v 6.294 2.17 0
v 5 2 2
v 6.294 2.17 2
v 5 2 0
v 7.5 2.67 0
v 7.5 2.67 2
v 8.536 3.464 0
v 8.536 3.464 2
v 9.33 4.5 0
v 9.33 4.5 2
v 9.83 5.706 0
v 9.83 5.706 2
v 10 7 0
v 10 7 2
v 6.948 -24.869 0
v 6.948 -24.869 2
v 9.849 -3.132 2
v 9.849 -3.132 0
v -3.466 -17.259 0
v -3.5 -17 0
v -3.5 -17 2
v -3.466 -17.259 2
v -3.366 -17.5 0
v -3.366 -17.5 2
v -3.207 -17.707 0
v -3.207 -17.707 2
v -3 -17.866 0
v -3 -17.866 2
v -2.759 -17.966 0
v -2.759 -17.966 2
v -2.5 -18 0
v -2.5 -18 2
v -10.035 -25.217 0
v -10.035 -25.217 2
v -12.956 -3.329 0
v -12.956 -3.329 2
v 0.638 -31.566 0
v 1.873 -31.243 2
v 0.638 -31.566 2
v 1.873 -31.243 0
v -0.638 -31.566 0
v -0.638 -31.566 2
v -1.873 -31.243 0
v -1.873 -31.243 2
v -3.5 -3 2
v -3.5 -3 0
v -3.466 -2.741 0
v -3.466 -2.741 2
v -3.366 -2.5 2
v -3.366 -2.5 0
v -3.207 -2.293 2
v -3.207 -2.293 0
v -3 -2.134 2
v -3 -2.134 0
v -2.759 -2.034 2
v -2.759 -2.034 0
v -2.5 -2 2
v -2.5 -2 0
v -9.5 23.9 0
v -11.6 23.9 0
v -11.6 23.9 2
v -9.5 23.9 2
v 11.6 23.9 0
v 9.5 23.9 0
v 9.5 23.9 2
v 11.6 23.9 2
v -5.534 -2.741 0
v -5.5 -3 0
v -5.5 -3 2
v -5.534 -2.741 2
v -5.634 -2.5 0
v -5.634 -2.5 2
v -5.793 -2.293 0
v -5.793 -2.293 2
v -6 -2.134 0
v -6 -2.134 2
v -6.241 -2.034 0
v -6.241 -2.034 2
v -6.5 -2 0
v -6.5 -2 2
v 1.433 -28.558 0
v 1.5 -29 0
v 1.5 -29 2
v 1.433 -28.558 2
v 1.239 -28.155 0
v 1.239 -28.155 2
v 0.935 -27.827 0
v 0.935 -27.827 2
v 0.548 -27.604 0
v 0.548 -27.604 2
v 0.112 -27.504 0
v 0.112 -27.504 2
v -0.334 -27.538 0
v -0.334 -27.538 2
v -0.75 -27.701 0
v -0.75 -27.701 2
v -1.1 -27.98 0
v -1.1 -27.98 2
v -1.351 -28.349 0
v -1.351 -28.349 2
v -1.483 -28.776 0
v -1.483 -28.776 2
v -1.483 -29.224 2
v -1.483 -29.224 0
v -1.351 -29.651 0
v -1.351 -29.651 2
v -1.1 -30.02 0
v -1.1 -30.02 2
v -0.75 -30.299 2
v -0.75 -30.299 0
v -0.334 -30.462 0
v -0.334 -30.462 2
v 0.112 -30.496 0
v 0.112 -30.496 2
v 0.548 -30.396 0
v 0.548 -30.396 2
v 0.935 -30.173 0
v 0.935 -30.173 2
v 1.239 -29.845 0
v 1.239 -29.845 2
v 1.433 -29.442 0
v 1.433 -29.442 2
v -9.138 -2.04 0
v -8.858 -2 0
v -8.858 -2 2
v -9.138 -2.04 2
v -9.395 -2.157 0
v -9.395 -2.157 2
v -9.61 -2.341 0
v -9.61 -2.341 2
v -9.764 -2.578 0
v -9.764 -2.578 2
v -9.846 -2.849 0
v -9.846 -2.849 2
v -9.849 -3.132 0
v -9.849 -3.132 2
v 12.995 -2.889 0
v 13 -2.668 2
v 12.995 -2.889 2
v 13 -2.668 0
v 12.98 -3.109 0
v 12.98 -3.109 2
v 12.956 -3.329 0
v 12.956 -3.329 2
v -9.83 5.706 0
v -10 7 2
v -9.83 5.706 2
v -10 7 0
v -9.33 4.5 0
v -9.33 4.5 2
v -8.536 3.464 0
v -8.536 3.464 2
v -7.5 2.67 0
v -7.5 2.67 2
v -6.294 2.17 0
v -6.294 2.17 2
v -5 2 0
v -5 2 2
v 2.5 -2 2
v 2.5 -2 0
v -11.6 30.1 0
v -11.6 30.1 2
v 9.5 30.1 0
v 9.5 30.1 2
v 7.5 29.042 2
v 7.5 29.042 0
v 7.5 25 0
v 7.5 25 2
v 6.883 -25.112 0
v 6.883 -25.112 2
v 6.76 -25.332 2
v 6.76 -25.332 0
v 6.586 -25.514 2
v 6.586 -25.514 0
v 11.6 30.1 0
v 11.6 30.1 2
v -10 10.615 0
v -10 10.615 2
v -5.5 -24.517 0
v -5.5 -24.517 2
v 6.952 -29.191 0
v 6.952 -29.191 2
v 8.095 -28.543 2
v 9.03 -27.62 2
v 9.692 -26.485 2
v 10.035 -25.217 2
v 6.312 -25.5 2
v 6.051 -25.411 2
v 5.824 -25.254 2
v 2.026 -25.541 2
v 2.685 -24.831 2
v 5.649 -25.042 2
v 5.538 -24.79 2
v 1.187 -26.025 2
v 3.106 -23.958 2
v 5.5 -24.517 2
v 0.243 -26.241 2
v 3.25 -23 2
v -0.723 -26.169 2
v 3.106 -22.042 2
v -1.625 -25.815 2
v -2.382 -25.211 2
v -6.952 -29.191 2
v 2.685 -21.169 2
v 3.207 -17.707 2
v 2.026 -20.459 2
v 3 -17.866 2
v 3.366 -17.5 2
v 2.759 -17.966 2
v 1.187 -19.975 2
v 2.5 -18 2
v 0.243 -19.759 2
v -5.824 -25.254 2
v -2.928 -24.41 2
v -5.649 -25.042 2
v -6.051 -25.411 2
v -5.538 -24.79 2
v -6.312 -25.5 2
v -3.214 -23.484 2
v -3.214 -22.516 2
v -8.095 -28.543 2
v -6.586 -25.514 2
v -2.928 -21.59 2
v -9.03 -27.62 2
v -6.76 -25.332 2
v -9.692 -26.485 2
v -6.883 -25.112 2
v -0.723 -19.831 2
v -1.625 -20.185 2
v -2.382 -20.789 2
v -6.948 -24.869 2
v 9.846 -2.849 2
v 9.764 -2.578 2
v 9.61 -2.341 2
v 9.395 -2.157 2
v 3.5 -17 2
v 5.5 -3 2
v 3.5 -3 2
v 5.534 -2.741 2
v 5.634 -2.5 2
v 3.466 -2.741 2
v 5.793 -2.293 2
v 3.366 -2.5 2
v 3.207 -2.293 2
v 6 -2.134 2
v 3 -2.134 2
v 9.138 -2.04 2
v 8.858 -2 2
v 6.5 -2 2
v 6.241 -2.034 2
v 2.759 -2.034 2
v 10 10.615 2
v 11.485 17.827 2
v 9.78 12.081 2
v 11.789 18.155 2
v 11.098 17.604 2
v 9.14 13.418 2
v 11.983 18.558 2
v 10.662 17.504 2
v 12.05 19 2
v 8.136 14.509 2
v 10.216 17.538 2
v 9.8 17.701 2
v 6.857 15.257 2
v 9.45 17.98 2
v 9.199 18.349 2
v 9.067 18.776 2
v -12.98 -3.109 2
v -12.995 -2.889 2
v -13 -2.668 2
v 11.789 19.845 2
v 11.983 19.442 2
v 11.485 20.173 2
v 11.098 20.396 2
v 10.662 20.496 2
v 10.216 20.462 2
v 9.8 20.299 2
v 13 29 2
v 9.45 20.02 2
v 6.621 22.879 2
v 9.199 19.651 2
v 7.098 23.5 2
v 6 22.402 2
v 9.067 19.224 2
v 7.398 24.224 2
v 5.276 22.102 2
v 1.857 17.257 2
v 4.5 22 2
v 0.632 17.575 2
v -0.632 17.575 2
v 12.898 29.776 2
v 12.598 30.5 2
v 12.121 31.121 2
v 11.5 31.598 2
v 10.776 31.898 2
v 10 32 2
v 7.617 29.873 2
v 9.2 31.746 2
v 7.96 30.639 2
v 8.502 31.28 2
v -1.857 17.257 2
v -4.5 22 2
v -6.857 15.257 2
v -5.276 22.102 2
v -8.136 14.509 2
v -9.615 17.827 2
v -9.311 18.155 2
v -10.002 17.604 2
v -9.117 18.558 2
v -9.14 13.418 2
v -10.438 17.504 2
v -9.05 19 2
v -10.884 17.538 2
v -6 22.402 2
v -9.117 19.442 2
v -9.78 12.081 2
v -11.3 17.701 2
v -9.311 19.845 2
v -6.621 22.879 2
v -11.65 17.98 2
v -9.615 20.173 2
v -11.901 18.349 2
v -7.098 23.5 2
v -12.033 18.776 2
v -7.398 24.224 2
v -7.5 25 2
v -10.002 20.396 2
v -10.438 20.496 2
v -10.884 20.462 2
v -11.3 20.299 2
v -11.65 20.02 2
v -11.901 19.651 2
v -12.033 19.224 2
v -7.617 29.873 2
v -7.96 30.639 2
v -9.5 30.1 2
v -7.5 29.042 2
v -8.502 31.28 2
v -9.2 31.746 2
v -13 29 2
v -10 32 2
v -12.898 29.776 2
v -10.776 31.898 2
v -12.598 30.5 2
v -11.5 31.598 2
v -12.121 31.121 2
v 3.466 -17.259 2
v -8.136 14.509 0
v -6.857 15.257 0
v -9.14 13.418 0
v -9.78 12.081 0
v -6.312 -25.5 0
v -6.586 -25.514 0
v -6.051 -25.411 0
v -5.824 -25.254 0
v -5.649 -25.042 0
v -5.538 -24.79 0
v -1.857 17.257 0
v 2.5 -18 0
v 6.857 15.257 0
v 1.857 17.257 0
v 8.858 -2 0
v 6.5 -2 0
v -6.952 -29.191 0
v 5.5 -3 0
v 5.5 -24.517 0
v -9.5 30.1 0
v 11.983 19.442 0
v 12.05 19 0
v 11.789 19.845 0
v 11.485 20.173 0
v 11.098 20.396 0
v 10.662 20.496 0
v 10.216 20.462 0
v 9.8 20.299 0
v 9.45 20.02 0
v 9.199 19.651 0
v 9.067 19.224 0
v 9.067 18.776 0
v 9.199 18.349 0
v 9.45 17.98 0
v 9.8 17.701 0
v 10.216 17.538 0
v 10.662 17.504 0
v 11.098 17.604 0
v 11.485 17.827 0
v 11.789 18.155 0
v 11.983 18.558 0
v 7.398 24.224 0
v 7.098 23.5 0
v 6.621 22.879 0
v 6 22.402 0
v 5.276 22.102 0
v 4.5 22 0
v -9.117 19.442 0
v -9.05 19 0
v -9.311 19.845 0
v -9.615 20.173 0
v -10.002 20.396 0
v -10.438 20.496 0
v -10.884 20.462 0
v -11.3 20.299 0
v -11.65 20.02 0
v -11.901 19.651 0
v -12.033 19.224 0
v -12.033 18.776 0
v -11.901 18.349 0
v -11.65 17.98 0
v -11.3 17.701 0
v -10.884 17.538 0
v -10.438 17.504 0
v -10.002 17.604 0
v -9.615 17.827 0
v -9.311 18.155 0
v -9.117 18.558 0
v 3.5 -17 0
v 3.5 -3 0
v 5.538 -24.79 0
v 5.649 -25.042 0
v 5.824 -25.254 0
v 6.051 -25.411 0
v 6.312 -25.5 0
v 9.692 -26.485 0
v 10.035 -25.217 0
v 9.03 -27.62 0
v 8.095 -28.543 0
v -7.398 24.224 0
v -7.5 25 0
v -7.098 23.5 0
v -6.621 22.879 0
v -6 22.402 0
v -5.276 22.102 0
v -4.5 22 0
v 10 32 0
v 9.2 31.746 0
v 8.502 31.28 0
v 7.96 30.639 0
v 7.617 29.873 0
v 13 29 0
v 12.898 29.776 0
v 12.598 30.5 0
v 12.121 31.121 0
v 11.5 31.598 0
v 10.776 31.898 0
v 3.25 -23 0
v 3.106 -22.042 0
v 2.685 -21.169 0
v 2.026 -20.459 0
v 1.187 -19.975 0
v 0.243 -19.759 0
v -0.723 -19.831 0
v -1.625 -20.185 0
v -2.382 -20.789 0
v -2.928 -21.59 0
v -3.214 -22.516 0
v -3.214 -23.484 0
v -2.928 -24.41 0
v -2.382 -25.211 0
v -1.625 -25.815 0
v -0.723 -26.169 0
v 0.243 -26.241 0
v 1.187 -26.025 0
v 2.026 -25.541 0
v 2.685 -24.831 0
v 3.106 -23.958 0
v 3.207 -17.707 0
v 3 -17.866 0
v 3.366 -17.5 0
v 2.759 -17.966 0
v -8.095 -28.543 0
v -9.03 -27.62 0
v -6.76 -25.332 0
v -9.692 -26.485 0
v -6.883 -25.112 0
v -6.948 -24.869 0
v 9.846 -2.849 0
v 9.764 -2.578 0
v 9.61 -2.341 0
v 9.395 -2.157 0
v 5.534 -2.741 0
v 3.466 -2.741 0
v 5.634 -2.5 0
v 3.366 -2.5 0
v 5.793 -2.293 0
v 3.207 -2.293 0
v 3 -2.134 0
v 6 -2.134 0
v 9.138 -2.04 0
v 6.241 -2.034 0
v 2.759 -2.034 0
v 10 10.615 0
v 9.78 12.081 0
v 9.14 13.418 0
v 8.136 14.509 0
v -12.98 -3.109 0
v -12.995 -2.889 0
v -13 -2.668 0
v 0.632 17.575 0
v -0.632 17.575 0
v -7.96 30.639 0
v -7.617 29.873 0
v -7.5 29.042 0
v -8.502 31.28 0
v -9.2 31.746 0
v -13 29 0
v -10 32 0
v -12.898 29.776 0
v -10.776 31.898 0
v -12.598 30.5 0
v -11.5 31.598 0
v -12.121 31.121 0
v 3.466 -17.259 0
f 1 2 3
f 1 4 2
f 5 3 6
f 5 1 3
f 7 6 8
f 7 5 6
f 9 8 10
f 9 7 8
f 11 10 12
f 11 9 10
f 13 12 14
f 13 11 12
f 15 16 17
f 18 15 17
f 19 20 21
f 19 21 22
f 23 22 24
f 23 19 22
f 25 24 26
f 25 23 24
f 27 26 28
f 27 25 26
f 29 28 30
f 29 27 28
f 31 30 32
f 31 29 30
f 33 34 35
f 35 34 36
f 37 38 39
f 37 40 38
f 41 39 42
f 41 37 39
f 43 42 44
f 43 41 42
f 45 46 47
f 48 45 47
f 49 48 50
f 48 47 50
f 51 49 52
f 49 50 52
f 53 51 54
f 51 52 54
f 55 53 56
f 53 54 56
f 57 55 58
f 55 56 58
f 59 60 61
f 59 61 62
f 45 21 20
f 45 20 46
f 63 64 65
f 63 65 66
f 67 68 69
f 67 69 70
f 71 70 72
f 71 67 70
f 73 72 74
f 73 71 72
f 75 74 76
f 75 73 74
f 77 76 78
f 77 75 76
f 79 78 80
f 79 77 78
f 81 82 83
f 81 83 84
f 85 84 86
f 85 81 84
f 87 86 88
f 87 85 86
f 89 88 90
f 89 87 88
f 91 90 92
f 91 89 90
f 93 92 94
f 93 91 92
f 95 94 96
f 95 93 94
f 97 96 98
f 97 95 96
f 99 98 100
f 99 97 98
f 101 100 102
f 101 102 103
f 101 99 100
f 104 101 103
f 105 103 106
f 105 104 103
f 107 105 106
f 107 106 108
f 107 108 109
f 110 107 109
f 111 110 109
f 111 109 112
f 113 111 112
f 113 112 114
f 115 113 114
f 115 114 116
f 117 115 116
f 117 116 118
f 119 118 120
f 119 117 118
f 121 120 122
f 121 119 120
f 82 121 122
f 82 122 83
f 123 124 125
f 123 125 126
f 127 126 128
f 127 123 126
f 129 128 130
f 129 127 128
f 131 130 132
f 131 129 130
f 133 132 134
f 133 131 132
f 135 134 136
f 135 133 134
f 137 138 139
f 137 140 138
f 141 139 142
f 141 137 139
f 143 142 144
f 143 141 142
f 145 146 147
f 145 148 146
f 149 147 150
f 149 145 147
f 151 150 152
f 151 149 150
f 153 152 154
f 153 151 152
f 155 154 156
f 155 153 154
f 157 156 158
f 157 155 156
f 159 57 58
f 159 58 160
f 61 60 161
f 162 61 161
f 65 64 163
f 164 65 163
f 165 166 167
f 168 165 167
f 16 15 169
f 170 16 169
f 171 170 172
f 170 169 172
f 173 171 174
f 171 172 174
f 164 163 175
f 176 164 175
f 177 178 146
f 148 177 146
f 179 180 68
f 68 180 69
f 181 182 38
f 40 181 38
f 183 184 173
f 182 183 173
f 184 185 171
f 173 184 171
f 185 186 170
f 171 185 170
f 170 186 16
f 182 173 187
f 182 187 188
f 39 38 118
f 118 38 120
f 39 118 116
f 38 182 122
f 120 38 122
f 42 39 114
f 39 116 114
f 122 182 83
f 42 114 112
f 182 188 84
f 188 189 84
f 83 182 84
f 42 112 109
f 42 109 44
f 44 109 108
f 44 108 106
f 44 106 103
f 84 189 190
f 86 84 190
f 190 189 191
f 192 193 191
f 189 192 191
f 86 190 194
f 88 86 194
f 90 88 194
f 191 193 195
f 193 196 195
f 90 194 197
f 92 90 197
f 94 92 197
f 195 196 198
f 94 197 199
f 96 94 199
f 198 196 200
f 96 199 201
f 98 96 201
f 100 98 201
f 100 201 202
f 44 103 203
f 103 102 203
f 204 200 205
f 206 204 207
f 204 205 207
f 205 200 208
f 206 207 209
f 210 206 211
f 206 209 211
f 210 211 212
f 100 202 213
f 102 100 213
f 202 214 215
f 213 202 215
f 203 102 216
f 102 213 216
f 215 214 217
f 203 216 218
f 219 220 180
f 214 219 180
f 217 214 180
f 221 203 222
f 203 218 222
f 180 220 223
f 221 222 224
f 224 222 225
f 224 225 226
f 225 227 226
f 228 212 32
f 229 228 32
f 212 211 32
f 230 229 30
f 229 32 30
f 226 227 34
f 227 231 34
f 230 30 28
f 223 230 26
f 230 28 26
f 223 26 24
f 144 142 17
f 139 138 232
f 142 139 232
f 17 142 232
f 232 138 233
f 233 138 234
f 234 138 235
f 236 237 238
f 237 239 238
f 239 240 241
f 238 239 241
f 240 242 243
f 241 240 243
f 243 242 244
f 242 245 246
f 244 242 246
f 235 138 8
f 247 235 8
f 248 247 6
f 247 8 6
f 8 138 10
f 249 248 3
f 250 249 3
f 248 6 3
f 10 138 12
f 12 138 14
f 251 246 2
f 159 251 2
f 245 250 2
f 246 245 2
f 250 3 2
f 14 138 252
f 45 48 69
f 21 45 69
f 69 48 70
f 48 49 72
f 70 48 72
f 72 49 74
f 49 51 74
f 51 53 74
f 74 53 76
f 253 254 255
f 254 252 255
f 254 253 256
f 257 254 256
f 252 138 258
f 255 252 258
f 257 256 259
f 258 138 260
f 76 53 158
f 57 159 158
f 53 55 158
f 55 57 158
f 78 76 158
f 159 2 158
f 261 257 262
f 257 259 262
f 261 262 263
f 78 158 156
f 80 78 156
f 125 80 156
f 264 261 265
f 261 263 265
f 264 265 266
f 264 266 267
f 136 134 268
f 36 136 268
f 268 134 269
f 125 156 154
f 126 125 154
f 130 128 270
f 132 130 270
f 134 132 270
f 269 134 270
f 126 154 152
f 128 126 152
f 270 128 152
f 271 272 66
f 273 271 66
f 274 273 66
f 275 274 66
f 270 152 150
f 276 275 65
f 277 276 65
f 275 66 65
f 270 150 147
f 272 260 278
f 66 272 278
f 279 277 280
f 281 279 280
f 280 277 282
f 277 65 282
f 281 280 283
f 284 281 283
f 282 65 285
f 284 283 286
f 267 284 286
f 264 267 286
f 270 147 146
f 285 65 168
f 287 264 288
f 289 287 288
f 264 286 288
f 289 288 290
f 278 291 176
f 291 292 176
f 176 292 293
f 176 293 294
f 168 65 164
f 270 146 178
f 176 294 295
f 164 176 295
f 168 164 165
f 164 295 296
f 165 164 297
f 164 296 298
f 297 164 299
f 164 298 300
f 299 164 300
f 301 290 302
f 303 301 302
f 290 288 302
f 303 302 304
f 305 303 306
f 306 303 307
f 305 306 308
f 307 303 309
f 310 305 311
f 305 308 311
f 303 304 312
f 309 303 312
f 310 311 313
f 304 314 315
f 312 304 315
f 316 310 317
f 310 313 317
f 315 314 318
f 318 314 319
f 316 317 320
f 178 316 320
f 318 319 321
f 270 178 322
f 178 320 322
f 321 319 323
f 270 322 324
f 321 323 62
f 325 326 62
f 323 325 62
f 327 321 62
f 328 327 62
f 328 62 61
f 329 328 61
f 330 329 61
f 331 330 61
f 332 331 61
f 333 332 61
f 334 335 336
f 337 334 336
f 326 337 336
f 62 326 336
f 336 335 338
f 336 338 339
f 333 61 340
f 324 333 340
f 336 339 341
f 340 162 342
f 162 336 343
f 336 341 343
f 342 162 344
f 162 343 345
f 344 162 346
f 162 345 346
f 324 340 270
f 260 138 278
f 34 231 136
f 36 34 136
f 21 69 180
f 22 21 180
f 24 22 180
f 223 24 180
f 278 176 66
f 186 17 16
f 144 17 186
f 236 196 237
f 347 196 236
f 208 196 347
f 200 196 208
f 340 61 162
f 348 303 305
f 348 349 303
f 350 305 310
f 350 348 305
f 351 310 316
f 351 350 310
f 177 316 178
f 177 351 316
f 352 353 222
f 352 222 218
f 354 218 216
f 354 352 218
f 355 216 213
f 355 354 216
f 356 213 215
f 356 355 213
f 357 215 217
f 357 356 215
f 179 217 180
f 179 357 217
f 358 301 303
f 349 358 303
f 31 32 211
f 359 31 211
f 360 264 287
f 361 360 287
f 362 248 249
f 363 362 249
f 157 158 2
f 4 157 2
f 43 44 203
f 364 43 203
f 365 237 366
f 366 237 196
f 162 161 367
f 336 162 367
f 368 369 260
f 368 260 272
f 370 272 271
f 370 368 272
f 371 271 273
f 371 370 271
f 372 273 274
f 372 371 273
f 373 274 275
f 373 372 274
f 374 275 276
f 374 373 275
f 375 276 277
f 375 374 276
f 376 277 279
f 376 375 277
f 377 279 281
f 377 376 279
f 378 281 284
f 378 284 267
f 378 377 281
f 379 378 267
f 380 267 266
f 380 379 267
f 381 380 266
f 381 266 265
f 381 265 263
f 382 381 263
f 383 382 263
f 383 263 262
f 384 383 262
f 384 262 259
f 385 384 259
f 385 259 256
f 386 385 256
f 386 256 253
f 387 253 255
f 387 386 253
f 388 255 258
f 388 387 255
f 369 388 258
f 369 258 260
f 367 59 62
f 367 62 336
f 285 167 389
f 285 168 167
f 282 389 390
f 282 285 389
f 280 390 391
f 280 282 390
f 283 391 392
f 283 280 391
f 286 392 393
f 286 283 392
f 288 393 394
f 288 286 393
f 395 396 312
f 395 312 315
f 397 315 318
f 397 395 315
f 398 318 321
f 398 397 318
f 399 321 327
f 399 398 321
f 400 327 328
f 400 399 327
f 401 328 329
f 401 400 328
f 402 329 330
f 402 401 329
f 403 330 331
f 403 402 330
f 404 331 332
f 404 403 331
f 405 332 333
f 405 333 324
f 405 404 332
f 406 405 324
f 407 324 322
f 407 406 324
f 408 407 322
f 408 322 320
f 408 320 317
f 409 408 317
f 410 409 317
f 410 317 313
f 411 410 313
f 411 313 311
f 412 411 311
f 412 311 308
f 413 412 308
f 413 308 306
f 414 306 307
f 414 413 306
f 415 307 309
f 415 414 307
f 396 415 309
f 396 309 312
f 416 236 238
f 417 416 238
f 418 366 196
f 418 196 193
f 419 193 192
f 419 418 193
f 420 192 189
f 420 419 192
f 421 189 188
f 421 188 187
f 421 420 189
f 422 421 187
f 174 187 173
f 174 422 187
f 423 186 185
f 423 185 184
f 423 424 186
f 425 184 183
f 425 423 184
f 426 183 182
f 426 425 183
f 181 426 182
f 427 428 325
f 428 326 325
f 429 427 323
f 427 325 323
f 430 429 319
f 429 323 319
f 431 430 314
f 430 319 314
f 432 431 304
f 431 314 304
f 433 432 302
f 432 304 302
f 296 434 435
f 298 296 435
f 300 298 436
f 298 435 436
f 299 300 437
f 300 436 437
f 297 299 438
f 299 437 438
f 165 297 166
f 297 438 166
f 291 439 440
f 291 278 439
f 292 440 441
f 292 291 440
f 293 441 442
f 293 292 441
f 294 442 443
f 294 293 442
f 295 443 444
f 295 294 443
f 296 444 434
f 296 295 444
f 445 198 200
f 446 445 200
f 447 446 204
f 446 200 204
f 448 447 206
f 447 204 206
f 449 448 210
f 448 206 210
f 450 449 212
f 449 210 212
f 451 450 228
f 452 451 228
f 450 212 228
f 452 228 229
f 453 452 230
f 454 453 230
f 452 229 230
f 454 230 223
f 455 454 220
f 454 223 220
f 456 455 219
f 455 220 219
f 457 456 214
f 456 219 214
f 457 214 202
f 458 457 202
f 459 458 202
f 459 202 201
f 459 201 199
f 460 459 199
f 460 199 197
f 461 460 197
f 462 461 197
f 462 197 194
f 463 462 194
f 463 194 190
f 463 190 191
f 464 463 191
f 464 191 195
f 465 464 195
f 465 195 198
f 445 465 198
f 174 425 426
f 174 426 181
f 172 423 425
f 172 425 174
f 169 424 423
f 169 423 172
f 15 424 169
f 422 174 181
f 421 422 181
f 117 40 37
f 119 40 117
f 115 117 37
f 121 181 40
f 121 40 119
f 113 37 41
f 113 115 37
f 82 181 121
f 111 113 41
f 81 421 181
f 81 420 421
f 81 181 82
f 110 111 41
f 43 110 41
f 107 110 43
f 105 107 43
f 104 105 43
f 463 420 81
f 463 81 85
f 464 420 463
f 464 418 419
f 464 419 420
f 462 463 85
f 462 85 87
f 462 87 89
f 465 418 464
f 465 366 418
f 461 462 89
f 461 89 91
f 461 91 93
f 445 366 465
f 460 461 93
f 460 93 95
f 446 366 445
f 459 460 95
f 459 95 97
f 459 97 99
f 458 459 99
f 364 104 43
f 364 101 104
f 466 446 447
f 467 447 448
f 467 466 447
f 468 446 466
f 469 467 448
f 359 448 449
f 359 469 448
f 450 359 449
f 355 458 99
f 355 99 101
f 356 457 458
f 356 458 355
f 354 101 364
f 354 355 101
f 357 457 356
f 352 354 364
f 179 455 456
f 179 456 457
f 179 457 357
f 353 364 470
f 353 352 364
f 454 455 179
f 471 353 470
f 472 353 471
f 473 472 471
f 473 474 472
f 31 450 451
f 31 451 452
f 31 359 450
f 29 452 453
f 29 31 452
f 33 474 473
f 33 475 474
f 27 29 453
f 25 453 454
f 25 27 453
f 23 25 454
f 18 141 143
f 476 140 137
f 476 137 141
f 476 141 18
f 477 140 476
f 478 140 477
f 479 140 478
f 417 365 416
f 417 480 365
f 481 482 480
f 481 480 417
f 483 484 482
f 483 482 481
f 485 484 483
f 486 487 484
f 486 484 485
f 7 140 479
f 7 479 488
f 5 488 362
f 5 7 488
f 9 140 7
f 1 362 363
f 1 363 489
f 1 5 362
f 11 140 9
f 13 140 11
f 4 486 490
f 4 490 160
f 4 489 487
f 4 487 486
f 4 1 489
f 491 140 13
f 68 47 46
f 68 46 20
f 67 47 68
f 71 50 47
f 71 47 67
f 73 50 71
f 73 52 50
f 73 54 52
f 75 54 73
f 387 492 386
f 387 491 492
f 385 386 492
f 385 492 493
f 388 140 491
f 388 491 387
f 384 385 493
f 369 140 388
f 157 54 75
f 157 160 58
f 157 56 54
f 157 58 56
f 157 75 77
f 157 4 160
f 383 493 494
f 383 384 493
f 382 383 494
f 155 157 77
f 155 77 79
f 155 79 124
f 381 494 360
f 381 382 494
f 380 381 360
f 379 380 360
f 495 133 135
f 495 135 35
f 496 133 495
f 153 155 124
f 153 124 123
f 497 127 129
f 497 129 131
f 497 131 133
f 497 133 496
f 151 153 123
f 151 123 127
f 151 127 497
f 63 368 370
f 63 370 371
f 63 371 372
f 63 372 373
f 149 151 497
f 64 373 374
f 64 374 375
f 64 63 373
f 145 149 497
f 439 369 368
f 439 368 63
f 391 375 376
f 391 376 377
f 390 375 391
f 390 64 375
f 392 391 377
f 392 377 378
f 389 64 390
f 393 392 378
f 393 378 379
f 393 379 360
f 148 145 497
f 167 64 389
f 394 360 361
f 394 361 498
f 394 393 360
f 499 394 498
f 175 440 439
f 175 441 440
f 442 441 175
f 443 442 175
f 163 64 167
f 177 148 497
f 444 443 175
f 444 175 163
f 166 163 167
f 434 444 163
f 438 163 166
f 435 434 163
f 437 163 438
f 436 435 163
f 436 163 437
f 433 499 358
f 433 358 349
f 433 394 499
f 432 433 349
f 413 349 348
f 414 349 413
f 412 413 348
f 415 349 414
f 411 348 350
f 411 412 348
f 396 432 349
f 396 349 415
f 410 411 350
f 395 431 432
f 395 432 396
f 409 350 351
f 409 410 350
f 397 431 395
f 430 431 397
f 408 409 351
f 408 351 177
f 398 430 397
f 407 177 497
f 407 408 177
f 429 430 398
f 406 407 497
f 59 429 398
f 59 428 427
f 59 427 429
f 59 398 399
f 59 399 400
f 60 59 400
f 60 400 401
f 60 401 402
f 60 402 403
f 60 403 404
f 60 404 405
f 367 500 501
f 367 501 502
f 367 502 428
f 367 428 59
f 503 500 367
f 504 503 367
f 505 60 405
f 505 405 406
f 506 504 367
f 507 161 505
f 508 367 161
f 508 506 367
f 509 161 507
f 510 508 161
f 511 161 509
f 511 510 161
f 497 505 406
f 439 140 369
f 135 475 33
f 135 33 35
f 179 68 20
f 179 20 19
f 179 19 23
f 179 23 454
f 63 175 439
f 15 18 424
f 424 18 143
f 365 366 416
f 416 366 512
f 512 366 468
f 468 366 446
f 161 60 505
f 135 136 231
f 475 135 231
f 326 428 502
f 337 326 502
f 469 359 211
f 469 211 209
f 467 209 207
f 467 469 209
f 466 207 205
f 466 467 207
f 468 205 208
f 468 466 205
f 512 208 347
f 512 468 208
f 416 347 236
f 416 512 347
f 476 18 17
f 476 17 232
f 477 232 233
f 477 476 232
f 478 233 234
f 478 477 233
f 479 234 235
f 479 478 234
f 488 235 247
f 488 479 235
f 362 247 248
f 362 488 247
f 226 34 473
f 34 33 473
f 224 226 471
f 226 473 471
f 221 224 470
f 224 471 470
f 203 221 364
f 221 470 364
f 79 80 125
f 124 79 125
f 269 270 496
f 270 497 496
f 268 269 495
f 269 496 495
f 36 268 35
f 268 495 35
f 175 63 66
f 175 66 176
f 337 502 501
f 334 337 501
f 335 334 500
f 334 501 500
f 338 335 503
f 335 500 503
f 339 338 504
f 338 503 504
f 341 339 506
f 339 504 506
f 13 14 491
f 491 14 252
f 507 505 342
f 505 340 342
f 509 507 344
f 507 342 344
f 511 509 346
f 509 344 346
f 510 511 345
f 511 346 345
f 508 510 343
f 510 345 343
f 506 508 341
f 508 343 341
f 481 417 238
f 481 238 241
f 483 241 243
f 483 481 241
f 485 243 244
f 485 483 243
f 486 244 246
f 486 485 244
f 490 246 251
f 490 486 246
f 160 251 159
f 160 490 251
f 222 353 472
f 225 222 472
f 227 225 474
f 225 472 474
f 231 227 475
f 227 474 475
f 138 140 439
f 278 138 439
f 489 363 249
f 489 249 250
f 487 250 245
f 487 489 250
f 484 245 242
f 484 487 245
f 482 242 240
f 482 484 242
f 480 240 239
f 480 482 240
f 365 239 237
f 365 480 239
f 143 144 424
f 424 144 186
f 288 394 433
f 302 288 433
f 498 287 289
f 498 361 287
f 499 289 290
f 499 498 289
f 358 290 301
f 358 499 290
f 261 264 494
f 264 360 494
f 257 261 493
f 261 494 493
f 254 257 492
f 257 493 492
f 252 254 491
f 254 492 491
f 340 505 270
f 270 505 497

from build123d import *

# Parameters (mm, degrees)
F0_R         = 1.5
F0_W         = 2.1
F0_H         = 6.2
F1_DEPTH     = 2
F2_R         = 3
F4_DEPTH     = 2.001
F5_R         = 5
F6_T1_DEPTH  = 16.7901994578
F7_W         = 7
F7_H         = 16
F7_R         = 3.25
F8_DEPTH     = 2.001
F9_R         = 5
F10_T1_DEPTH = 2


# Not quite as in the source:
# - a fillet or chamfer that OpenCascade refuses, or shapes differently, is made with other operations: its cross-section is extruded or revolved along the edge and cut away or added


with BuildPart() as f1:
    # F0 (on Top) → F1 (new body)
    with BuildSketch(Plane.XY):
        Polygon((-13, -32), (13, -32), (13, 32), (7.5, 32), (7.5, 22), (-7.5, 22), (-7.5, 32), (-13, 32), align=None)
        with Locations((0, -29)):
            Circle(F0_R, mode=Mode.SUBTRACT)
        with Locations((-10.55, 19)):
            Circle(F0_R, mode=Mode.SUBTRACT)
        with Locations((-10.55, 27)):
            Rectangle(F0_W, F0_H, mode=Mode.SUBTRACT)
        with Locations((10.55, 19)):
            Circle(F0_R, mode=Mode.SUBTRACT)
        with Locations((10.55, 27)):
            Rectangle(F0_W, F0_H, mode=Mode.SUBTRACT)
    extrude(amount=F1_DEPTH)

    # F2
    f2_edges = [f1.edges().sort_by_distance(p)[0] for p in [
        (13, 32, 1),
        (7.5, 22, 1),
        (-7.5, 22, 1),
        (-13, 32, 1),
    ]]
    fillet(f2_edges, radius=F2_R)

    # F3 (on face) → F4 (cut, through all)
    with BuildSketch(Plane.XY.offset(2)):
        Polygon((-9.65, -28.1011469207), (-13, -3), (-13, -33), (13, -33), (13, -3), (9.65, -28.1011469207), (0, -32), align=None)
    extrude(amount=-F4_DEPTH, mode=Mode.SUBTRACT)

    # F5
    f5_edges = [f1.edges().sort_by_distance(p)[0] for p in [
        (9.65, -28.101147, 1),
        (-9.65, -28.101147, 1),
        (13, -3, 1),
        (0, -32, 1),
        (-13, -3, 1),
    ]]
    fillet(f5_edges, radius=F5_R)

    # F6: fillet of radius 3 on 2 edges, made by hand

    # F6_s2 → F6_t1 (cut)
    with BuildSketch(Plane.XY.offset(-7.3950997289)):
        with BuildLine():
            ThreePointArc((-7.5, 29.0419601084), (-8.2087121525, 30.9784517816), (-10, 32))
            Line((-10, 32), (-7.5, 32))
            Line((-7.5, 32), (-7.5, 29.0419601084))
        make_face()
        with BuildLine():
            ThreePointArc((10, 32), (8.2087121525, 30.9784517816), (7.5, 29.0419601084))
            Line((7.5, 29.0419601084), (7.5, 32))
            Line((7.5, 32), (10, 32))
        make_face()
    extrude(amount=F6_T1_DEPTH, mode=Mode.SUBTRACT)

    # F7 (on face) → F8 (cut, through all)
    with BuildSketch(Plane.XY.offset(2)):
        Polygon((10, 14), (0, 18), (-10, 14), (-10, 2), (10, 2), align=None)
        Polygon((-5.5, -2), (-10, -2), (-6.8708787487, -25.4461290331), (-5.5, -26), align=None)
        Polygon((6.8708787487, -25.4461290331), (10, -2), (5.5, -2), (5.5, -26), align=None)
        with Locations((0, -10)):
            Rectangle(F7_W, F7_H)
        with Locations((0, -23)):
            Circle(F7_R)
    extrude(amount=-F8_DEPTH, mode=Mode.SUBTRACT)

    # F9
    f9_edges = [f1.edges().sort_by_distance(p)[0] for p in [
        (-10, 14, 1),
        (0, 18, 1),
        (10, 14, 1),
        (-10, 2, 1),
        (10, 2, 1),
    ]]
    fillet(f9_edges, radius=F9_R)

    # F10: fillet of radius 1 on 12 edges, made by hand

    # F10_s2 → F10_t1 (join)
    with BuildSketch(Plane.XY):
        with BuildLine():
            ThreePointArc((-8.8576734794, -2), (-9.6100985971, -2.3413222015), (-9.8488849195, -3.1322871156))
            Line((-9.8488849195, -3.1322871156), (-10, -2))
            Line((-10, -2), (-8.8576734794, -2))
        make_face()
        with BuildLine():
            ThreePointArc((-3.5, -3), (-3.2071067812, -2.2928932188), (-2.5, -2))
            Line((-2.5, -2), (-3.5, -2))
            Line((-3.5, -2), (-3.5, -3))
        make_face()
        with BuildLine():
            ThreePointArc((6.5, -2), (5.7928932188, -2.2928932188), (5.5, -3))
            Line((5.5, -3), (5.5, -2))
            Line((5.5, -2), (6.5, -2))
        make_face()
        with BuildLine():
            ThreePointArc((-5.5, -3), (-5.7928932188, -2.2928932188), (-6.5, -2))
            Line((-6.5, -2), (-5.5, -2))
            Line((-5.5, -2), (-5.5, -3))
        make_face()
        with BuildLine():
            ThreePointArc((3.5, -3), (3.2071067812, -2.2928932188), (2.5, -2))
            Line((2.5, -2), (3.5, -2))
            Line((3.5, -2), (3.5, -3))
        make_face()
        with BuildLine():
            ThreePointArc((9.8488849195, -3.1322871156), (9.6100985971, -2.3413222015), (8.8576734794, -2))
            Line((8.8576734794, -2), (10, -2))
            Line((10, -2), (9.8488849195, -3.1322871156))
        make_face()
        with BuildLine():
            ThreePointArc((-3.5, -17), (-3.2071067812, -17.7071067812), (-2.5, -18))
            Line((-2.5, -18), (-3.5, -18))
            Line((-3.5, -18), (-3.5, -17))
        make_face()
        with BuildLine():
            ThreePointArc((2.5, -18), (3.2071067812, -17.7071067812), (3.5, -17))
            Line((3.5, -17), (3.5, -18))
            Line((3.5, -18), (2.5, -18))
        make_face()
        with BuildLine():
            ThreePointArc((-6.3312640971, -25.6641475042), (-6.7468030166, -25.3498829497), (-6.9478689438, -24.8692507652))
            Line((-6.9478689438, -24.8692507652), (-6.8708787487, -25.4461290331))
            Line((-6.8708787487, -25.4461290331), (-6.3312640971, -25.6641475042))
        make_face()
        with BuildLine():
            ThreePointArc((6.9478689438, -24.8692507652), (6.7468030166, -25.3498829497), (6.3312640971, -25.6641475042))
            Line((6.3312640971, -25.6641475042), (6.8708787487, -25.4461290331))
            Line((6.8708787487, -25.4461290331), (6.9478689438, -24.8692507652))
        make_face()
        with BuildLine():
            ThreePointArc((5.5, -24.5174390315), (5.9408070965, -25.346476604), (6.8746065934, -25.4446228861))
            Line((6.8746065934, -25.4446228861), (5.5, -26))
            Line((5.5, -26), (5.5, -24.5174390315))
        make_face()
        with BuildLine():
            ThreePointArc((-6.8746065934, -25.4446228861), (-5.9408070965, -25.346476604), (-5.5, -24.5174390315))
            Line((-5.5, -24.5174390315), (-5.5, -26))
            Line((-5.5, -26), (-6.8746065934, -25.4446228861))
        make_face()
    extrude(amount=F10_T1_DEPTH)


solid = f1.part
